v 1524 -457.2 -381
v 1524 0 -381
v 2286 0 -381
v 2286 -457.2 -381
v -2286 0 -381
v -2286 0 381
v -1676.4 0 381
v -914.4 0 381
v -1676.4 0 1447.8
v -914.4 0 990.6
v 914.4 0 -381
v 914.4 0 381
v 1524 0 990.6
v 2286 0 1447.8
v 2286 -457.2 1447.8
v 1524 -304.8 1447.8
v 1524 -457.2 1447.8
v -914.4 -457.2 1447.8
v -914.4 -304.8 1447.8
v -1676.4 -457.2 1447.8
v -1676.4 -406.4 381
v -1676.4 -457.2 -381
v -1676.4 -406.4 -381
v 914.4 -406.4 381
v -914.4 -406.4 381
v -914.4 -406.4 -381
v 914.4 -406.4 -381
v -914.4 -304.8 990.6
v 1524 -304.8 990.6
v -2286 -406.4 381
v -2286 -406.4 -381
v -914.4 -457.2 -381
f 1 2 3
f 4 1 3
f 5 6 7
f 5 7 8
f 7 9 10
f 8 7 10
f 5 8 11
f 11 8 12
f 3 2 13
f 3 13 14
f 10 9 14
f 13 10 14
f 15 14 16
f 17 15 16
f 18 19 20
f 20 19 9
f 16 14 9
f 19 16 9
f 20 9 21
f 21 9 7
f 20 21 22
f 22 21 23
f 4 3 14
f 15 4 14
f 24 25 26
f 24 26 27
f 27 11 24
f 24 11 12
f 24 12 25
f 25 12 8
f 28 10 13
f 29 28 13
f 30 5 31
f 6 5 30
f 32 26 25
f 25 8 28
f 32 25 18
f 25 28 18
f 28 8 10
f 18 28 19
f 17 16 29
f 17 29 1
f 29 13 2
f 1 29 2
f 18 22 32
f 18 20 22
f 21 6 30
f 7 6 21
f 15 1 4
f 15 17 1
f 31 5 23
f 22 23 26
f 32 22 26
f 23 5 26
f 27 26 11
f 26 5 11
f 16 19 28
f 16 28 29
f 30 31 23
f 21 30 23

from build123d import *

# Parameters (mm, degrees)
F0_W     = 609.6
F0_H     = 762
F1_DEPTH = 406.4
F2_DEPTH = 457.2
F0_W_2   = 2438.4
F0_H_2   = 457.2
F3_DEPTH = 304.8


with BuildPart() as f1:
    # F0 (on Front) → F1 (new body)
    with BuildSketch(Plane.XZ):
        with Locations((-609.6, 0)):
            Rectangle(F0_W, F0_H)
        Rectangle(F0_W, F0_H)
        with Locations((609.6, 0)):
            Rectangle(F0_W, F0_H)
        with Locations((-1981.2, 0)):
            Rectangle(F0_W, F0_H)
    extrude(amount=F1_DEPTH)

    # F0 (on Front) → F2 (join)
    with BuildSketch(Plane.XZ):
        Polygon((-1676.4, -381), (-914.4, -381), (-914.4, 381), (-914.4, 990.6), (-914.4, 1447.8), (-1676.4, 1447.8), (-1676.4, 381), align=None)
        Polygon((1524, 381), (1524, -381), (2286, -381), (2286, 1447.8), (1524, 1447.8), (1524, 990.6), align=None)
    extrude(amount=F2_DEPTH)

    # F0 (on Front) → F3 (join)
    with BuildSketch(Plane.XZ):
        with Locations((304.8, 1219.2)):
            Rectangle(F0_W_2, F0_H_2)
    extrude(amount=F3_DEPTH)


solid = f1.part
